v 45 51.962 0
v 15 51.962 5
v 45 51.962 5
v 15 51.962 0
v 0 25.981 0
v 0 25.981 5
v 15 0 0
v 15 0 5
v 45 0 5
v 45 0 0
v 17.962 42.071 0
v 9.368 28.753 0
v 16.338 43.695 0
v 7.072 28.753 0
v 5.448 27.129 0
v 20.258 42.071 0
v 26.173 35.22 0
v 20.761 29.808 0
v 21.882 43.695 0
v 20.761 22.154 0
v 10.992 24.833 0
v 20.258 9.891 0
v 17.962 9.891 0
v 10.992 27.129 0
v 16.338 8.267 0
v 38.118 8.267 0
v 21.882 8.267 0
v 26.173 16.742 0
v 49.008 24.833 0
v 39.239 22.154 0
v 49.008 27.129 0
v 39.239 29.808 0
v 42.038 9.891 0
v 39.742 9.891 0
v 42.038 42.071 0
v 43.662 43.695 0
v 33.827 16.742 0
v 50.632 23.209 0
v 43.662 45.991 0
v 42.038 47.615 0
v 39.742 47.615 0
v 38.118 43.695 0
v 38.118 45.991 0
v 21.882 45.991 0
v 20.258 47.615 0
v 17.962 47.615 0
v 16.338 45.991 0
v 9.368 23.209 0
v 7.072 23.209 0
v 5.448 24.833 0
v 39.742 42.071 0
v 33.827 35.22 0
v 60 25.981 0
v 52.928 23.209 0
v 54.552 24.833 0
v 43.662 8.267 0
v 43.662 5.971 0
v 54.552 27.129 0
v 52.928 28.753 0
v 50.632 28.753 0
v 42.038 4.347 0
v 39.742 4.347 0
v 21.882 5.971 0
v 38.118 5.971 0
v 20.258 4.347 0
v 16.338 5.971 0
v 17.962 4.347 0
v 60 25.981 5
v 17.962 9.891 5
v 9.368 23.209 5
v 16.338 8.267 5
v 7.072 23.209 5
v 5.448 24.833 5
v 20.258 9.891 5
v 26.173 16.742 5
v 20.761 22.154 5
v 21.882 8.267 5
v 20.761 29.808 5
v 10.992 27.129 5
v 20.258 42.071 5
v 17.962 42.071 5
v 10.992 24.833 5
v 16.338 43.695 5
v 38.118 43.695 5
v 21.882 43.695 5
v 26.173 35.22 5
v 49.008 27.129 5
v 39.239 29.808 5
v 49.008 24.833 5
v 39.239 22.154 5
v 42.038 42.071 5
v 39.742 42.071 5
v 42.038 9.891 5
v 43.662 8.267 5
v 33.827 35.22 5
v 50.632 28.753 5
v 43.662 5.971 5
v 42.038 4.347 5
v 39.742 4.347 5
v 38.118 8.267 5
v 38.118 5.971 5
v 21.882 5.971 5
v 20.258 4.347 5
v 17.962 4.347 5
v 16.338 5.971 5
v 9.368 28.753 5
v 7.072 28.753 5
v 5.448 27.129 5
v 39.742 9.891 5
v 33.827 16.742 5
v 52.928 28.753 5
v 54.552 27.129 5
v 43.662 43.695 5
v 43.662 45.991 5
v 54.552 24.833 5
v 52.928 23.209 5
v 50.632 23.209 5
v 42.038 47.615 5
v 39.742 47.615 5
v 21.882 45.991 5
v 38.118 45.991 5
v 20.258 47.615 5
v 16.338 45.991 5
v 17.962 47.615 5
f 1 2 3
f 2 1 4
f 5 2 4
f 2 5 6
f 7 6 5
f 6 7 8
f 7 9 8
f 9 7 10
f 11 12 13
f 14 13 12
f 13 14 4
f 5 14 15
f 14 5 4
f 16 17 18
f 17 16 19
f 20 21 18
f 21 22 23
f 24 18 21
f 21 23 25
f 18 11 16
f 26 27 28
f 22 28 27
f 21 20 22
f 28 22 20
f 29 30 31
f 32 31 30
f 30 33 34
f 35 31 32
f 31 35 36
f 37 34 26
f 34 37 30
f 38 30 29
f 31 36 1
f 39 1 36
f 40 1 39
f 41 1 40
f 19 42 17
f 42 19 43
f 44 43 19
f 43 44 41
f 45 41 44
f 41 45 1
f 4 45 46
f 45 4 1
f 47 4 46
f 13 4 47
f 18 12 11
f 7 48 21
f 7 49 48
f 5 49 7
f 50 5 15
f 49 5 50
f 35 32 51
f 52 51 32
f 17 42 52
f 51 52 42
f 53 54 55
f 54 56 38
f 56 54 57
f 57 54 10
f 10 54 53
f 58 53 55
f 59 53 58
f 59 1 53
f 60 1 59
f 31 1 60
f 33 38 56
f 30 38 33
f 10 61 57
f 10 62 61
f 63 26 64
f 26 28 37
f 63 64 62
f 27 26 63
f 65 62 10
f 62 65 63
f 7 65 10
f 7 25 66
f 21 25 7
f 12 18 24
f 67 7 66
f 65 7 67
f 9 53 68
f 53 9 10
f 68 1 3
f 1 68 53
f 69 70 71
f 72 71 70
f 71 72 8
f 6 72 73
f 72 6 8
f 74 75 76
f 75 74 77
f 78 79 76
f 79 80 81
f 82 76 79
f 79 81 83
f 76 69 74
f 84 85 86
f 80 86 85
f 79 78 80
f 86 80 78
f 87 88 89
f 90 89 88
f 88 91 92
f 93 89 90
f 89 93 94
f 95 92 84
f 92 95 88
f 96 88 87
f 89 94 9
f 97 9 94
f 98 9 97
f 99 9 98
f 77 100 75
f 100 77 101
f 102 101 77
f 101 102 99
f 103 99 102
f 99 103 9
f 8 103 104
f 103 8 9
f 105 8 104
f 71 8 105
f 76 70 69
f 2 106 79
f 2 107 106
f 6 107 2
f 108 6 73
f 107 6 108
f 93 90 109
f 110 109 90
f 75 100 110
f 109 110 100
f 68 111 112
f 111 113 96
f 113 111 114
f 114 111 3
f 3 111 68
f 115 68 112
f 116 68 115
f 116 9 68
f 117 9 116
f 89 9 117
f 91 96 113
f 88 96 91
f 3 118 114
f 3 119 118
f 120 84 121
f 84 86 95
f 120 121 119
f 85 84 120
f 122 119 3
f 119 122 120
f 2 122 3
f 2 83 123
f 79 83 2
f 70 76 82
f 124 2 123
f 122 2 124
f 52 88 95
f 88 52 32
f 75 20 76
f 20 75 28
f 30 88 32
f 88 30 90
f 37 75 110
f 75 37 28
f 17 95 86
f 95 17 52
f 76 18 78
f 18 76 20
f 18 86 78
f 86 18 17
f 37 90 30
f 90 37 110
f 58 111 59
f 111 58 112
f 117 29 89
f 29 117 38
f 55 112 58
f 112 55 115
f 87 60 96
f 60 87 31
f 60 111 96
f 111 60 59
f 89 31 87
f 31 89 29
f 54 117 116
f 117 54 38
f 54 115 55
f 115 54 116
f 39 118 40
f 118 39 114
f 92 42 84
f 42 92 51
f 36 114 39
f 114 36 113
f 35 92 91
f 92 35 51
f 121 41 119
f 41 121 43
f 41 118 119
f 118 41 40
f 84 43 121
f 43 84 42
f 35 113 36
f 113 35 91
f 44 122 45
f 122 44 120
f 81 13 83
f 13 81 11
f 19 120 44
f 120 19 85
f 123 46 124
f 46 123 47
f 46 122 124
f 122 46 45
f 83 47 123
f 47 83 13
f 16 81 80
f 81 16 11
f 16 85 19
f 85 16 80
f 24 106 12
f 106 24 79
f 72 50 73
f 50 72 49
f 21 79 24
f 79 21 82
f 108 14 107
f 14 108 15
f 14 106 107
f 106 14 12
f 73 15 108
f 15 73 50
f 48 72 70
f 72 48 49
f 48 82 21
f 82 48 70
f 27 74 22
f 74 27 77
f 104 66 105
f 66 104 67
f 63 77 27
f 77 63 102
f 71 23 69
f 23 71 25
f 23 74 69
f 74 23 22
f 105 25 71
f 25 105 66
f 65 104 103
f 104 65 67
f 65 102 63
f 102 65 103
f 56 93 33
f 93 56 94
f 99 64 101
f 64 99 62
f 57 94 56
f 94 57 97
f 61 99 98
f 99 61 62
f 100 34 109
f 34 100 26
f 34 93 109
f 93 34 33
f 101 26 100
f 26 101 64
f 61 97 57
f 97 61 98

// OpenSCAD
$fn = 32;

// ----------------------------------------------------------------------
// Polygon plate: 6-gon R30, 6 bolt windows
// ----------------------------------------------------------------------

// --- parameters (mm) ---
sides = 6;                // number of polygon sides
plate_r = 30;             // circumscribed radius of the polygon
bore_r = 10;              // centre bore radius
bolts = 6;                // number of bolt windows
ring_r = 21.78;           // bolt-circle radius
bolt_r = 3;               // bolt window radius
plate_t = 5;              // plate thickness, Z (extrusion height)

plate_d = 2 * plate_r;  // circumscribed diameter
bore_d = 2 * bore_r;  // centre bore diameter
bolt_d = 2 * bolt_r;  // bolt window diameter
ring_d = 2 * ring_r;  // bolt-circle diameter

profile = [[60, 25.981], [45, 51.962], [15, 51.962], [0, 25.981], [15, 0], [45, 0]];  // primary outline, 6 points, counter clockwise
void_1 = [[39.239, 29.808], [33.827, 35.22], [26.173, 35.22], [20.761, 29.808], [20.761, 22.154], [26.173, 16.742], [33.827, 16.742], [39.239, 22.154]];  // centre bore, 8 points
void_2 = [[54.552, 27.129], [52.928, 28.753], [50.632, 28.753], [49.008, 27.129], [49.008, 24.833], [50.632, 23.209], [52.928, 23.209], [54.552, 24.833]];  // bolt window 1, 8 points
void_3 = [[43.662, 45.991], [42.038, 47.615], [39.742, 47.615], [38.118, 45.991], [38.118, 43.695], [39.742, 42.071], [42.038, 42.071], [43.662, 43.695]];  // bolt window 2, 8 points
void_4 = [[21.882, 45.991], [20.258, 47.615], [17.962, 47.615], [16.338, 45.991], [16.338, 43.695], [17.962, 42.071], [20.258, 42.071], [21.882, 43.695]];  // bolt window 3, 8 points
void_5 = [[10.992, 27.129], [9.368, 28.753], [7.072, 28.753], [5.448, 27.129], [5.448, 24.833], [7.072, 23.209], [9.368, 23.209], [10.992, 24.833]];  // bolt window 4, 8 points
void_6 = [[21.882, 8.267], [20.258, 9.891], [17.962, 9.891], [16.338, 8.267], [16.338, 5.971], [17.962, 4.347], [20.258, 4.347], [21.882, 5.971]];  // bolt window 5, 8 points
void_7 = [[43.662, 8.267], [42.038, 9.891], [39.742, 9.891], [38.118, 8.267], [38.118, 5.971], [39.742, 4.347], [42.038, 4.347], [43.662, 5.971]];  // bolt window 6, 8 points

// --- the one profile operation ---
difference() {
  linear_extrude(height = plate_t) polygon(points = profile);
  translate([0, 0, -1])
    linear_extrude(height = plate_t + 2) polygon(points = void_1);
  translate([0, 0, -1])
    linear_extrude(height = plate_t + 2) polygon(points = void_2);
  translate([0, 0, -1])
    linear_extrude(height = plate_t + 2) polygon(points = void_3);
  translate([0, 0, -1])
    linear_extrude(height = plate_t + 2) polygon(points = void_4);
  translate([0, 0, -1])
    linear_extrude(height = plate_t + 2) polygon(points = void_5);
  translate([0, 0, -1])
    linear_extrude(height = plate_t + 2) polygon(points = void_6);
  translate([0, 0, -1])
    linear_extrude(height = plate_t + 2) polygon(points = void_7);
}
